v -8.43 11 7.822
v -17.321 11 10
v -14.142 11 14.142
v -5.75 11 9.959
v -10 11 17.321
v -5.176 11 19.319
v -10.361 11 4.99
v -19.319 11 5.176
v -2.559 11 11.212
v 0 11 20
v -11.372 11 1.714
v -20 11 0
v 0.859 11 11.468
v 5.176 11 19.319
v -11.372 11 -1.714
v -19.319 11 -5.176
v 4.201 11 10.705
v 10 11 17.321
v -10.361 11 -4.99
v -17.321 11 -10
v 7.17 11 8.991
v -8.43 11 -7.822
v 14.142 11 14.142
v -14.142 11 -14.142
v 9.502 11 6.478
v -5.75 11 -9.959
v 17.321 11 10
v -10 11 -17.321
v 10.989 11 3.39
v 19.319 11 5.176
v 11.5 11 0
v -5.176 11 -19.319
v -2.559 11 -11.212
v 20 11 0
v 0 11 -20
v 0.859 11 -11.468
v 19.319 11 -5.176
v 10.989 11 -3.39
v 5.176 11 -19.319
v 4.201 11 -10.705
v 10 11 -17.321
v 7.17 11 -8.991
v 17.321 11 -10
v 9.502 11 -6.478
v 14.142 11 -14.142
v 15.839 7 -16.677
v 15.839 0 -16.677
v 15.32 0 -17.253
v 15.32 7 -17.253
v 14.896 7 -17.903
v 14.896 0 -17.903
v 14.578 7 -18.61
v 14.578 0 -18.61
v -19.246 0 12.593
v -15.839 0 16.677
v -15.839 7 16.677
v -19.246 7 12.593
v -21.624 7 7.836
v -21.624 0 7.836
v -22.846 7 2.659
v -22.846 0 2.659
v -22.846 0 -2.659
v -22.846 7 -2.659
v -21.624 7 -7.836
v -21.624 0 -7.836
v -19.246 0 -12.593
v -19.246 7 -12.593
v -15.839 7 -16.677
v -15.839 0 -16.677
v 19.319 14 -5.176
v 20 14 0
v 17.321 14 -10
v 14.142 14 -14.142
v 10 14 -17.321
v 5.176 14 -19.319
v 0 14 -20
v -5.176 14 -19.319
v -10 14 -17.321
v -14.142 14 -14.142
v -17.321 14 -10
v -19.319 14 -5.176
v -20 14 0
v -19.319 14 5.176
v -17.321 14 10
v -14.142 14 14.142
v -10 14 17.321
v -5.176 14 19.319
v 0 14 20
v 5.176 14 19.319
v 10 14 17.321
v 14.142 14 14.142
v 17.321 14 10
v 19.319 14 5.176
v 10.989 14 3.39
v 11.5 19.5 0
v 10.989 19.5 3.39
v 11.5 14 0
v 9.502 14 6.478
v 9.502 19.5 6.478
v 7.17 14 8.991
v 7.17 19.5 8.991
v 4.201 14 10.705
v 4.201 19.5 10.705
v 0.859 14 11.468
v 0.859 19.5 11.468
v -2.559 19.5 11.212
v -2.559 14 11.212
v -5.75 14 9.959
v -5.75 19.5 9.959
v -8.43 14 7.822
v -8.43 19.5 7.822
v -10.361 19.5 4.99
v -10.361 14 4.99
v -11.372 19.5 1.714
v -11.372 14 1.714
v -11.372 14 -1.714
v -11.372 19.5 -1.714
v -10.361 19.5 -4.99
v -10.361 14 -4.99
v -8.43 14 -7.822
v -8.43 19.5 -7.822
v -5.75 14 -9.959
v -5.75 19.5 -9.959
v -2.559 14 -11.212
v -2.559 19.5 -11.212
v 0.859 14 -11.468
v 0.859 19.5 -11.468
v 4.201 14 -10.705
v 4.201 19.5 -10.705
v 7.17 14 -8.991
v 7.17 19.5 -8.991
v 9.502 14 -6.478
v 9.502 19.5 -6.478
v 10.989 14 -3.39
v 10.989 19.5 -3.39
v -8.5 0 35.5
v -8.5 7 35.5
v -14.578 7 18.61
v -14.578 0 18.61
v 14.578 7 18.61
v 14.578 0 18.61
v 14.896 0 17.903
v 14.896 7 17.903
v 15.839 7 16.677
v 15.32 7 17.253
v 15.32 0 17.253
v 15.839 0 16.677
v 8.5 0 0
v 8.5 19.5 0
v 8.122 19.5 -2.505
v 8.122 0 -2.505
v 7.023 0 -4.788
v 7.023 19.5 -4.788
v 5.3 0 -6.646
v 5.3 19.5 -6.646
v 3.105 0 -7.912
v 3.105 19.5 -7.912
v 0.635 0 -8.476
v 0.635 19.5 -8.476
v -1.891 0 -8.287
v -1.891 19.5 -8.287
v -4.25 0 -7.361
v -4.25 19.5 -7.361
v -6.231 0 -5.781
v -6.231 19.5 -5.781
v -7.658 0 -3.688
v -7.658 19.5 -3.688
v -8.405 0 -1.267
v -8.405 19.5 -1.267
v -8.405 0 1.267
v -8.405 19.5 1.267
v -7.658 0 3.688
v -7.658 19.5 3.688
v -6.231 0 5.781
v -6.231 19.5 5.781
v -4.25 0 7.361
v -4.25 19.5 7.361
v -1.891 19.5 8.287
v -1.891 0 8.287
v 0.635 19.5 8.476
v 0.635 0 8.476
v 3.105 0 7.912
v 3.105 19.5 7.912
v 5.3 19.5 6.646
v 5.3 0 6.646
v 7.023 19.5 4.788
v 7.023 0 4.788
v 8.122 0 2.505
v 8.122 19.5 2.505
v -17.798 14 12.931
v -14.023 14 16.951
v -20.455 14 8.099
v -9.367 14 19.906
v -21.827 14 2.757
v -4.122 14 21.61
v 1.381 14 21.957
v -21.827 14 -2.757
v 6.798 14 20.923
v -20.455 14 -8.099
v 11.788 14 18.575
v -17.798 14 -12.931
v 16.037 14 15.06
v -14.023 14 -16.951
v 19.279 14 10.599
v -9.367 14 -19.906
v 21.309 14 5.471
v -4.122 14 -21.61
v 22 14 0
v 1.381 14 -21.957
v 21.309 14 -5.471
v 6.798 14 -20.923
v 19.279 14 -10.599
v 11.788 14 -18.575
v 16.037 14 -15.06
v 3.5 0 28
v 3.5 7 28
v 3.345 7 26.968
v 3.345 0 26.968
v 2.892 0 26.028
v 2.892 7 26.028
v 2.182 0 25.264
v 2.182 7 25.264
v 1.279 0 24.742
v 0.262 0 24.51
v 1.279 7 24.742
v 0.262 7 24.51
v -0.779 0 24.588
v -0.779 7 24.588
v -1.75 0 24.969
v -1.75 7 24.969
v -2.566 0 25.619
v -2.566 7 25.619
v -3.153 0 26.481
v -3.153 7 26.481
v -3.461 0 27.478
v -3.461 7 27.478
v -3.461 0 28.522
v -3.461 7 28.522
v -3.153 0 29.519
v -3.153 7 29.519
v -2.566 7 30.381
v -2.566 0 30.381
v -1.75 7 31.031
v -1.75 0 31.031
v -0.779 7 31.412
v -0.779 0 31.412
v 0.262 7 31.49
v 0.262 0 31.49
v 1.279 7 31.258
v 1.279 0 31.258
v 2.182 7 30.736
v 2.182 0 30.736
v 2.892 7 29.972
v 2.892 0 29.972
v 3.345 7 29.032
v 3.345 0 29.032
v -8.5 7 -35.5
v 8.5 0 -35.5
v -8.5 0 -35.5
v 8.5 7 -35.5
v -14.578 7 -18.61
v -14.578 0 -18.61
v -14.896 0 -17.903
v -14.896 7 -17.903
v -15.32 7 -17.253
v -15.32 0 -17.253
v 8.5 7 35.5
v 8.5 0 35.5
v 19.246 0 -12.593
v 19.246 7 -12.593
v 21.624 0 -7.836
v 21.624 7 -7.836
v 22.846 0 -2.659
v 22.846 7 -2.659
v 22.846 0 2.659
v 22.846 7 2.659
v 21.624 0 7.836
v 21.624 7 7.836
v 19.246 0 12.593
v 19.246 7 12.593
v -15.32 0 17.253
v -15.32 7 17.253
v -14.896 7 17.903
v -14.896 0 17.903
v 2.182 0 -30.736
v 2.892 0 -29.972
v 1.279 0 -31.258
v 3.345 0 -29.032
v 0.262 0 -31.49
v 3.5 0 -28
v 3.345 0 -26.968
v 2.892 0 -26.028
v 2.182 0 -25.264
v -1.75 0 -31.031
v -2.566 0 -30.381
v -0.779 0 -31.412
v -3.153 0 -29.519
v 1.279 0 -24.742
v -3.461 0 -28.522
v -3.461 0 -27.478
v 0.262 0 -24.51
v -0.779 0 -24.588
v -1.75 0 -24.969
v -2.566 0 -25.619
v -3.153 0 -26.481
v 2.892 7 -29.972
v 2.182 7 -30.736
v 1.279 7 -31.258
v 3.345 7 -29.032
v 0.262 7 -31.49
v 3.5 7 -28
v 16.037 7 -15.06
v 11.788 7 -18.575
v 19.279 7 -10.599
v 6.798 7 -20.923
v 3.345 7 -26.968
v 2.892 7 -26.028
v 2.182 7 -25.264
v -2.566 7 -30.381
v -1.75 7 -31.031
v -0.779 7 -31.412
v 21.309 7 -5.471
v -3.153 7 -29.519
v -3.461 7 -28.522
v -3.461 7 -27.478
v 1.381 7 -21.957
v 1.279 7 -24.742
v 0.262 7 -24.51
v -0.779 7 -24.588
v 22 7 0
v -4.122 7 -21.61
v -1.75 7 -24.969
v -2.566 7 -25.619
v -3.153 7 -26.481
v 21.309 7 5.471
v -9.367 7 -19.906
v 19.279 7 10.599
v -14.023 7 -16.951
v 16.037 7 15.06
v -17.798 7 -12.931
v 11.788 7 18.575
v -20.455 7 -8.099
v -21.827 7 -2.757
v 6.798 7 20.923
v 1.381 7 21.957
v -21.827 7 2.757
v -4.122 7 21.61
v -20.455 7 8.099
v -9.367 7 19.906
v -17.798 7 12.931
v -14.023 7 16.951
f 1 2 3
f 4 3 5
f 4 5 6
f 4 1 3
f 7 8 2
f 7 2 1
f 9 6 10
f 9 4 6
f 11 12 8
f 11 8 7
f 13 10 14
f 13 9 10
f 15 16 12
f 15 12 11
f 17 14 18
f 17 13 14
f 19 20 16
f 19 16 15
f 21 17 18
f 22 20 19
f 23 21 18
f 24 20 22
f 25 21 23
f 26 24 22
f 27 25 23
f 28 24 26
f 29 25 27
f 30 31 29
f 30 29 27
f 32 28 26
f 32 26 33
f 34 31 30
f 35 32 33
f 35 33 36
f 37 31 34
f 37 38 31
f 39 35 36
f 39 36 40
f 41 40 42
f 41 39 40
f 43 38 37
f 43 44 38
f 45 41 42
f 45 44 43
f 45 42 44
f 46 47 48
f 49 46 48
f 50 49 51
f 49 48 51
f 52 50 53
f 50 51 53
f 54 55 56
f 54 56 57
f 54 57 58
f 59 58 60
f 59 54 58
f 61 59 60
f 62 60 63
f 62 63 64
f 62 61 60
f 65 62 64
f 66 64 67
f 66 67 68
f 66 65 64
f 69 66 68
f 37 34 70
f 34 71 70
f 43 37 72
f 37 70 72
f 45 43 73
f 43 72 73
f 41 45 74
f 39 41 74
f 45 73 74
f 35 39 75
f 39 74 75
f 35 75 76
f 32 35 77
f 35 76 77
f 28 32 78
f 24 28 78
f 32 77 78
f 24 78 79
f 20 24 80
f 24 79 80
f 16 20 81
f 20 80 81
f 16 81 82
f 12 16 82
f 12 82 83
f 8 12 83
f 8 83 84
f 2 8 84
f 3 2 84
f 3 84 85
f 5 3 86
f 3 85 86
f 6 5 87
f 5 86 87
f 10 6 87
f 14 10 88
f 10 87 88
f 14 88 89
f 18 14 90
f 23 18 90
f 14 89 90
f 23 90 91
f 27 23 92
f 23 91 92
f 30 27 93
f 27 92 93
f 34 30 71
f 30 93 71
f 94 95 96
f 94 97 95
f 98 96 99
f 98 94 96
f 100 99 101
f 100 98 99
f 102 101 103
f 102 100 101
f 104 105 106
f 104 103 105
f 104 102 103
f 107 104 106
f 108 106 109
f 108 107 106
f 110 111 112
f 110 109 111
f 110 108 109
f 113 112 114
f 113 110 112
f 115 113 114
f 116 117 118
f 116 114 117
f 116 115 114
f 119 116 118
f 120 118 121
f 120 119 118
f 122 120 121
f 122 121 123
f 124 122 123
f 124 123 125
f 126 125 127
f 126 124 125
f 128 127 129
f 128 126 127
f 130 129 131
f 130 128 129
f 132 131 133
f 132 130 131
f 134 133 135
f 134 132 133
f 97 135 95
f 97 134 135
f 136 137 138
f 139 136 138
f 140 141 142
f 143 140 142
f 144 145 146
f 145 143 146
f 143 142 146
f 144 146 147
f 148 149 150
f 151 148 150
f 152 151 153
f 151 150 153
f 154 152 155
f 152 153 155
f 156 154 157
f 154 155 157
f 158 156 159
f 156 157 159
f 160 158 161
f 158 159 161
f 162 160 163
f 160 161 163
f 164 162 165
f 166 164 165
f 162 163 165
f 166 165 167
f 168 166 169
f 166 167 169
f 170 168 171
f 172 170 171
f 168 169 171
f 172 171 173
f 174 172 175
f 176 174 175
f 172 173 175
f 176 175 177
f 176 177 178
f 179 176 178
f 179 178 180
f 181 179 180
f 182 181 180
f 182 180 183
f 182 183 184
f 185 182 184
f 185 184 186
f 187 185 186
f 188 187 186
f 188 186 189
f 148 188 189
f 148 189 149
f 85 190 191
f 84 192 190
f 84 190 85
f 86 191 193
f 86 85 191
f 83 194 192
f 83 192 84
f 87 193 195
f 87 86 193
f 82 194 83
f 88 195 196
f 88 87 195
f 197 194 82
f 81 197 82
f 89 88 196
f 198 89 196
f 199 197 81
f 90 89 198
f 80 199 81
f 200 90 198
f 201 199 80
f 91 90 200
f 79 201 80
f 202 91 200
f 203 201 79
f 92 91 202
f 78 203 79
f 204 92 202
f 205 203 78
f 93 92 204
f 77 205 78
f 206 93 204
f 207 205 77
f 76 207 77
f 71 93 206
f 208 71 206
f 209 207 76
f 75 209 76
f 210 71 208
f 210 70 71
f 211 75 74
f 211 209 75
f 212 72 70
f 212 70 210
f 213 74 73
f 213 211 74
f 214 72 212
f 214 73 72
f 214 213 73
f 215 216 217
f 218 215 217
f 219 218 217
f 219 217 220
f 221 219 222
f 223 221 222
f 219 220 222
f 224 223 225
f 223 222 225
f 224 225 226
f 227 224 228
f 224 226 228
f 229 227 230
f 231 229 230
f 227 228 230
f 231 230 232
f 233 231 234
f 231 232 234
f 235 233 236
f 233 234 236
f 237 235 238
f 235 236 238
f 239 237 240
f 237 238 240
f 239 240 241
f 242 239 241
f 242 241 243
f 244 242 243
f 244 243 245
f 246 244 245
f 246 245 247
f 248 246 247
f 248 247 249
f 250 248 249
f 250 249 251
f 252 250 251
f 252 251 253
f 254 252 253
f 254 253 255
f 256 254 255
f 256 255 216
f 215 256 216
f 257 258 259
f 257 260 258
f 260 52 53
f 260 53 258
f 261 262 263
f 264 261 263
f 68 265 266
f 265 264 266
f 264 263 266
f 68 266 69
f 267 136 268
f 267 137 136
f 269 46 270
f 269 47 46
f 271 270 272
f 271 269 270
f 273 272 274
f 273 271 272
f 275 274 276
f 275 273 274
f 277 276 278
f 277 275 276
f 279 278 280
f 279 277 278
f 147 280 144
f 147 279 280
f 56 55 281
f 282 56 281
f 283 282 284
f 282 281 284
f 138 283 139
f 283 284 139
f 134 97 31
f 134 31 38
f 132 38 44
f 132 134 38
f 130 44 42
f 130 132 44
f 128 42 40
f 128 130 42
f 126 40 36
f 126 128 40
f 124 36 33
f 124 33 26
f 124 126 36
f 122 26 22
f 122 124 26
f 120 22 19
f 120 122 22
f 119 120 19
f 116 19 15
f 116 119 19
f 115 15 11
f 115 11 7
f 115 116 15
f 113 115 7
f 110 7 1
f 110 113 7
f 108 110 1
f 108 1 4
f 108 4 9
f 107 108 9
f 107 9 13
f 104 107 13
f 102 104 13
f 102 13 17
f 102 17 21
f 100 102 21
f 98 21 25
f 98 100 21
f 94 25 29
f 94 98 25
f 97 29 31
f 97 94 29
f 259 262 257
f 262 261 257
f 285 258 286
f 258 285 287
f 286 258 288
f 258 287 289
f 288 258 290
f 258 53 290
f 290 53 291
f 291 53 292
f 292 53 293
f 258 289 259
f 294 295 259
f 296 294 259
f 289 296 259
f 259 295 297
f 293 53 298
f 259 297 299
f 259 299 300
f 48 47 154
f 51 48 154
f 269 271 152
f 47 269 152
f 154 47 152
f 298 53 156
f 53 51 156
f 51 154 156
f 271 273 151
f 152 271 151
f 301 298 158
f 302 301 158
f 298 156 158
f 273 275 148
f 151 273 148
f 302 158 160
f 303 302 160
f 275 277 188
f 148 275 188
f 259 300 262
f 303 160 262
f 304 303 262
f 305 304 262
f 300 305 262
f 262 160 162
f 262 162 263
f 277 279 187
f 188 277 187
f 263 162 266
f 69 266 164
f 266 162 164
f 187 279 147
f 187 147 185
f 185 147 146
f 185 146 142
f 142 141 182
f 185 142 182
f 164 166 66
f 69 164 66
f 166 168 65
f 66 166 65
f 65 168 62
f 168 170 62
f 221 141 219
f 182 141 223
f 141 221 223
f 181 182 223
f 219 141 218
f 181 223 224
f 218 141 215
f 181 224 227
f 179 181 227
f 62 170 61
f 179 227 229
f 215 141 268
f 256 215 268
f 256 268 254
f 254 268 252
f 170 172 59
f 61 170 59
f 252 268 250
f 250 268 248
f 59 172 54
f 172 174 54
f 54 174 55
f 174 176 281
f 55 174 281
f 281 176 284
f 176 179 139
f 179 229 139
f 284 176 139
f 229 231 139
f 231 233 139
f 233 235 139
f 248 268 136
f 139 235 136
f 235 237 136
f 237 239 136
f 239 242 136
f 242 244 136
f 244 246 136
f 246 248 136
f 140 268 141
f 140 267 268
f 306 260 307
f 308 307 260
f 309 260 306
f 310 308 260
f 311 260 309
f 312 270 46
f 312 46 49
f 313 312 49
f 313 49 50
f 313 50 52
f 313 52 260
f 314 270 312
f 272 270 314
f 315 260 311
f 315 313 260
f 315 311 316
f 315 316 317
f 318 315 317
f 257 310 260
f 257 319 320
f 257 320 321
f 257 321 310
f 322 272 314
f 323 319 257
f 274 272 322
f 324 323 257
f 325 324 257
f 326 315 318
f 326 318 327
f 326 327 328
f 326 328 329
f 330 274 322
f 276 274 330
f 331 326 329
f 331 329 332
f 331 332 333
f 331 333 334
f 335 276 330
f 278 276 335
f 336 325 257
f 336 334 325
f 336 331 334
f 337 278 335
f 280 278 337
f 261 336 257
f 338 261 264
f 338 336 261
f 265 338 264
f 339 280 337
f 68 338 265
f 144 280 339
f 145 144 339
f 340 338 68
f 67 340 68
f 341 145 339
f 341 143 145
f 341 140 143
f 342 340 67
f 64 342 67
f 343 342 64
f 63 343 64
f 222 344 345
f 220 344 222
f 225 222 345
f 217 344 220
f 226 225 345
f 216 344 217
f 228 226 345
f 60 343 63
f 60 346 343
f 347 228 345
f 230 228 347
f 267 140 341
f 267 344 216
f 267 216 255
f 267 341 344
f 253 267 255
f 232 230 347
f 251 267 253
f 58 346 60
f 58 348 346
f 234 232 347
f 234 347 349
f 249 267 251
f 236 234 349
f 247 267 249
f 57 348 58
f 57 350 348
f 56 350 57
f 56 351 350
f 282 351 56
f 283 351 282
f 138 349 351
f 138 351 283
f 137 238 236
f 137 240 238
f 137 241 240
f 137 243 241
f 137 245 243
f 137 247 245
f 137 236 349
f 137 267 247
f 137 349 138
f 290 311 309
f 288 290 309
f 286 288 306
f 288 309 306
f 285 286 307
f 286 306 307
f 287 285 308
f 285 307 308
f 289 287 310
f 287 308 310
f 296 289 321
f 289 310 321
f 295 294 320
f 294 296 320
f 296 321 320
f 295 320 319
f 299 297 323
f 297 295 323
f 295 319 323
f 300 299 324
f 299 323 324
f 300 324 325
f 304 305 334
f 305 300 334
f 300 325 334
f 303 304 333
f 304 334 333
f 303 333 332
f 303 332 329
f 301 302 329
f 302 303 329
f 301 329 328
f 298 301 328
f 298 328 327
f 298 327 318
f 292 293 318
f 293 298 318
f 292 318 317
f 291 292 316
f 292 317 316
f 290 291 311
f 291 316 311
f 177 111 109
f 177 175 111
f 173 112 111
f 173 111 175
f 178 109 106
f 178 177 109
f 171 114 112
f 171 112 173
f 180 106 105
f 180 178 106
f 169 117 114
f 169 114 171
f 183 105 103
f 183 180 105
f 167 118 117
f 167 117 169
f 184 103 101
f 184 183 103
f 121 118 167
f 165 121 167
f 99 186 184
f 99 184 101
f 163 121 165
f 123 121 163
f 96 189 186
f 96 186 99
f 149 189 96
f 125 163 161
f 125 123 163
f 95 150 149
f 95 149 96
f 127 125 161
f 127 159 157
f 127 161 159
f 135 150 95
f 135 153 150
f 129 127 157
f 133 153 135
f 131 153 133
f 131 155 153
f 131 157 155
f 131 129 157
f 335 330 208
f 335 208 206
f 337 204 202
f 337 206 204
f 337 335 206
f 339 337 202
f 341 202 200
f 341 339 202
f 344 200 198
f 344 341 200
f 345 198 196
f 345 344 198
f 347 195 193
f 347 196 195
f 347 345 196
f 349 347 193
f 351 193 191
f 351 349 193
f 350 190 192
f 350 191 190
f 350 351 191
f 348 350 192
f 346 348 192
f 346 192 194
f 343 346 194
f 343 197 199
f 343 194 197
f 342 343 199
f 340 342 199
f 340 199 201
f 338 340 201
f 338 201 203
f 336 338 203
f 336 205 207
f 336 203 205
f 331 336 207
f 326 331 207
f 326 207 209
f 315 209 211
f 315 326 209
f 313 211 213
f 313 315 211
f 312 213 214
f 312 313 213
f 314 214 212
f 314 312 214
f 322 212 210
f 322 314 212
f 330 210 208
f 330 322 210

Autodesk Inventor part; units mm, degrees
ref_plane "YZ Plane" through (0, 0, 0) normal (1, 0, 0) x (0, 1, 0)
ref_plane "XZ Plane" through (0, 0, 0) normal (0, 1, 0) x (-1, 0, 0)
ref_plane "XY Plane" through (0, 0, 0) normal (0, 0, 1) x (1, 0, 0)
sketch "Sketch1" plane through (0, 0, 0) normal (0, 1, 0) x (-1, 0, 0)
  circle A0 centre (0, 0) radius 23
  dimension "d0" = 46
extrude "Extrusion1" add sketch "Sketch1" along normal blind 7
sketch "Sketch2" plane through (0, 7, 0) normal (0, 1, 0) x (1, 0, 0)
  line L0 (-8.5, -35.5) -> (8.5, -35.5)
  line L1 (-8.5, -35.5) -> (-15, -17.4356)
  circle A0 centre (0, 0) radius 23 projected
  line L2 (8.5, -35.5) -> (15, -17.4356)
  circle A1 centre (0, -28) radius 3.5
  point P0 (0, -35.5)
  dimension "d3" = 17
  dimension "d4" = 35.5
  dimension "d5" = 7
  dimension "d6" = 28
  dimension "d7" = 30
extrude "Extrusion2" add sketch "Sketch2" against normal blind 7 contours L1 A0 L2 L0
fillet "Fillet1" radius 5 2 edges at (15, 3.5, 17.4356) (-15, 3.5, 17.4356)
mirror "Mirror1" about plane through (0, 0, 0) normal (0, 0, 1) of "Extrusion2", "Fillet1"
sketch "Sketch3" plane through (0, 7, 0) normal (0, 1, 0) x (1, 0, 0)
  circle A0 centre (0, 0) radius 22
  dimension "d11" = 44
extrude "Extrusion3" add sketch "Sketch3" along normal blind 7
sketch "Sketch4" plane through (0, 14, 0) normal (0, 1, 0) x (1, 0, 0)
  circle A0 centre (0, 0) radius 11.5
  dimension "d14" = 23
extrude "Extrusion4" add sketch "Sketch4" along normal blind 5.5
sketch "Sketch5" plane through (0, 19.5, 0) normal (0, 1, 0) x (1, 0, 0)
  circle A0 centre (0, 0) radius 8.5
  dimension "d17" = 17
extrude "Extrusion5" cut sketch "Sketch5" against normal through all
sketch "Sketch6" plane through (0, 14, 0) normal (0, 1, 0) x (1, 0, 0)
  circle A0 centre (0, 0) radius 20
  circle A1 centre (0, 0) radius 11.5 projected
  dimension "d20" = 40
extrude "Extrusion6" cut sketch "Sketch6" against normal blind 3
properties part number "HCMUTE-CDT23-GOI_DO_PHI-17" material "Stainless Steel"
